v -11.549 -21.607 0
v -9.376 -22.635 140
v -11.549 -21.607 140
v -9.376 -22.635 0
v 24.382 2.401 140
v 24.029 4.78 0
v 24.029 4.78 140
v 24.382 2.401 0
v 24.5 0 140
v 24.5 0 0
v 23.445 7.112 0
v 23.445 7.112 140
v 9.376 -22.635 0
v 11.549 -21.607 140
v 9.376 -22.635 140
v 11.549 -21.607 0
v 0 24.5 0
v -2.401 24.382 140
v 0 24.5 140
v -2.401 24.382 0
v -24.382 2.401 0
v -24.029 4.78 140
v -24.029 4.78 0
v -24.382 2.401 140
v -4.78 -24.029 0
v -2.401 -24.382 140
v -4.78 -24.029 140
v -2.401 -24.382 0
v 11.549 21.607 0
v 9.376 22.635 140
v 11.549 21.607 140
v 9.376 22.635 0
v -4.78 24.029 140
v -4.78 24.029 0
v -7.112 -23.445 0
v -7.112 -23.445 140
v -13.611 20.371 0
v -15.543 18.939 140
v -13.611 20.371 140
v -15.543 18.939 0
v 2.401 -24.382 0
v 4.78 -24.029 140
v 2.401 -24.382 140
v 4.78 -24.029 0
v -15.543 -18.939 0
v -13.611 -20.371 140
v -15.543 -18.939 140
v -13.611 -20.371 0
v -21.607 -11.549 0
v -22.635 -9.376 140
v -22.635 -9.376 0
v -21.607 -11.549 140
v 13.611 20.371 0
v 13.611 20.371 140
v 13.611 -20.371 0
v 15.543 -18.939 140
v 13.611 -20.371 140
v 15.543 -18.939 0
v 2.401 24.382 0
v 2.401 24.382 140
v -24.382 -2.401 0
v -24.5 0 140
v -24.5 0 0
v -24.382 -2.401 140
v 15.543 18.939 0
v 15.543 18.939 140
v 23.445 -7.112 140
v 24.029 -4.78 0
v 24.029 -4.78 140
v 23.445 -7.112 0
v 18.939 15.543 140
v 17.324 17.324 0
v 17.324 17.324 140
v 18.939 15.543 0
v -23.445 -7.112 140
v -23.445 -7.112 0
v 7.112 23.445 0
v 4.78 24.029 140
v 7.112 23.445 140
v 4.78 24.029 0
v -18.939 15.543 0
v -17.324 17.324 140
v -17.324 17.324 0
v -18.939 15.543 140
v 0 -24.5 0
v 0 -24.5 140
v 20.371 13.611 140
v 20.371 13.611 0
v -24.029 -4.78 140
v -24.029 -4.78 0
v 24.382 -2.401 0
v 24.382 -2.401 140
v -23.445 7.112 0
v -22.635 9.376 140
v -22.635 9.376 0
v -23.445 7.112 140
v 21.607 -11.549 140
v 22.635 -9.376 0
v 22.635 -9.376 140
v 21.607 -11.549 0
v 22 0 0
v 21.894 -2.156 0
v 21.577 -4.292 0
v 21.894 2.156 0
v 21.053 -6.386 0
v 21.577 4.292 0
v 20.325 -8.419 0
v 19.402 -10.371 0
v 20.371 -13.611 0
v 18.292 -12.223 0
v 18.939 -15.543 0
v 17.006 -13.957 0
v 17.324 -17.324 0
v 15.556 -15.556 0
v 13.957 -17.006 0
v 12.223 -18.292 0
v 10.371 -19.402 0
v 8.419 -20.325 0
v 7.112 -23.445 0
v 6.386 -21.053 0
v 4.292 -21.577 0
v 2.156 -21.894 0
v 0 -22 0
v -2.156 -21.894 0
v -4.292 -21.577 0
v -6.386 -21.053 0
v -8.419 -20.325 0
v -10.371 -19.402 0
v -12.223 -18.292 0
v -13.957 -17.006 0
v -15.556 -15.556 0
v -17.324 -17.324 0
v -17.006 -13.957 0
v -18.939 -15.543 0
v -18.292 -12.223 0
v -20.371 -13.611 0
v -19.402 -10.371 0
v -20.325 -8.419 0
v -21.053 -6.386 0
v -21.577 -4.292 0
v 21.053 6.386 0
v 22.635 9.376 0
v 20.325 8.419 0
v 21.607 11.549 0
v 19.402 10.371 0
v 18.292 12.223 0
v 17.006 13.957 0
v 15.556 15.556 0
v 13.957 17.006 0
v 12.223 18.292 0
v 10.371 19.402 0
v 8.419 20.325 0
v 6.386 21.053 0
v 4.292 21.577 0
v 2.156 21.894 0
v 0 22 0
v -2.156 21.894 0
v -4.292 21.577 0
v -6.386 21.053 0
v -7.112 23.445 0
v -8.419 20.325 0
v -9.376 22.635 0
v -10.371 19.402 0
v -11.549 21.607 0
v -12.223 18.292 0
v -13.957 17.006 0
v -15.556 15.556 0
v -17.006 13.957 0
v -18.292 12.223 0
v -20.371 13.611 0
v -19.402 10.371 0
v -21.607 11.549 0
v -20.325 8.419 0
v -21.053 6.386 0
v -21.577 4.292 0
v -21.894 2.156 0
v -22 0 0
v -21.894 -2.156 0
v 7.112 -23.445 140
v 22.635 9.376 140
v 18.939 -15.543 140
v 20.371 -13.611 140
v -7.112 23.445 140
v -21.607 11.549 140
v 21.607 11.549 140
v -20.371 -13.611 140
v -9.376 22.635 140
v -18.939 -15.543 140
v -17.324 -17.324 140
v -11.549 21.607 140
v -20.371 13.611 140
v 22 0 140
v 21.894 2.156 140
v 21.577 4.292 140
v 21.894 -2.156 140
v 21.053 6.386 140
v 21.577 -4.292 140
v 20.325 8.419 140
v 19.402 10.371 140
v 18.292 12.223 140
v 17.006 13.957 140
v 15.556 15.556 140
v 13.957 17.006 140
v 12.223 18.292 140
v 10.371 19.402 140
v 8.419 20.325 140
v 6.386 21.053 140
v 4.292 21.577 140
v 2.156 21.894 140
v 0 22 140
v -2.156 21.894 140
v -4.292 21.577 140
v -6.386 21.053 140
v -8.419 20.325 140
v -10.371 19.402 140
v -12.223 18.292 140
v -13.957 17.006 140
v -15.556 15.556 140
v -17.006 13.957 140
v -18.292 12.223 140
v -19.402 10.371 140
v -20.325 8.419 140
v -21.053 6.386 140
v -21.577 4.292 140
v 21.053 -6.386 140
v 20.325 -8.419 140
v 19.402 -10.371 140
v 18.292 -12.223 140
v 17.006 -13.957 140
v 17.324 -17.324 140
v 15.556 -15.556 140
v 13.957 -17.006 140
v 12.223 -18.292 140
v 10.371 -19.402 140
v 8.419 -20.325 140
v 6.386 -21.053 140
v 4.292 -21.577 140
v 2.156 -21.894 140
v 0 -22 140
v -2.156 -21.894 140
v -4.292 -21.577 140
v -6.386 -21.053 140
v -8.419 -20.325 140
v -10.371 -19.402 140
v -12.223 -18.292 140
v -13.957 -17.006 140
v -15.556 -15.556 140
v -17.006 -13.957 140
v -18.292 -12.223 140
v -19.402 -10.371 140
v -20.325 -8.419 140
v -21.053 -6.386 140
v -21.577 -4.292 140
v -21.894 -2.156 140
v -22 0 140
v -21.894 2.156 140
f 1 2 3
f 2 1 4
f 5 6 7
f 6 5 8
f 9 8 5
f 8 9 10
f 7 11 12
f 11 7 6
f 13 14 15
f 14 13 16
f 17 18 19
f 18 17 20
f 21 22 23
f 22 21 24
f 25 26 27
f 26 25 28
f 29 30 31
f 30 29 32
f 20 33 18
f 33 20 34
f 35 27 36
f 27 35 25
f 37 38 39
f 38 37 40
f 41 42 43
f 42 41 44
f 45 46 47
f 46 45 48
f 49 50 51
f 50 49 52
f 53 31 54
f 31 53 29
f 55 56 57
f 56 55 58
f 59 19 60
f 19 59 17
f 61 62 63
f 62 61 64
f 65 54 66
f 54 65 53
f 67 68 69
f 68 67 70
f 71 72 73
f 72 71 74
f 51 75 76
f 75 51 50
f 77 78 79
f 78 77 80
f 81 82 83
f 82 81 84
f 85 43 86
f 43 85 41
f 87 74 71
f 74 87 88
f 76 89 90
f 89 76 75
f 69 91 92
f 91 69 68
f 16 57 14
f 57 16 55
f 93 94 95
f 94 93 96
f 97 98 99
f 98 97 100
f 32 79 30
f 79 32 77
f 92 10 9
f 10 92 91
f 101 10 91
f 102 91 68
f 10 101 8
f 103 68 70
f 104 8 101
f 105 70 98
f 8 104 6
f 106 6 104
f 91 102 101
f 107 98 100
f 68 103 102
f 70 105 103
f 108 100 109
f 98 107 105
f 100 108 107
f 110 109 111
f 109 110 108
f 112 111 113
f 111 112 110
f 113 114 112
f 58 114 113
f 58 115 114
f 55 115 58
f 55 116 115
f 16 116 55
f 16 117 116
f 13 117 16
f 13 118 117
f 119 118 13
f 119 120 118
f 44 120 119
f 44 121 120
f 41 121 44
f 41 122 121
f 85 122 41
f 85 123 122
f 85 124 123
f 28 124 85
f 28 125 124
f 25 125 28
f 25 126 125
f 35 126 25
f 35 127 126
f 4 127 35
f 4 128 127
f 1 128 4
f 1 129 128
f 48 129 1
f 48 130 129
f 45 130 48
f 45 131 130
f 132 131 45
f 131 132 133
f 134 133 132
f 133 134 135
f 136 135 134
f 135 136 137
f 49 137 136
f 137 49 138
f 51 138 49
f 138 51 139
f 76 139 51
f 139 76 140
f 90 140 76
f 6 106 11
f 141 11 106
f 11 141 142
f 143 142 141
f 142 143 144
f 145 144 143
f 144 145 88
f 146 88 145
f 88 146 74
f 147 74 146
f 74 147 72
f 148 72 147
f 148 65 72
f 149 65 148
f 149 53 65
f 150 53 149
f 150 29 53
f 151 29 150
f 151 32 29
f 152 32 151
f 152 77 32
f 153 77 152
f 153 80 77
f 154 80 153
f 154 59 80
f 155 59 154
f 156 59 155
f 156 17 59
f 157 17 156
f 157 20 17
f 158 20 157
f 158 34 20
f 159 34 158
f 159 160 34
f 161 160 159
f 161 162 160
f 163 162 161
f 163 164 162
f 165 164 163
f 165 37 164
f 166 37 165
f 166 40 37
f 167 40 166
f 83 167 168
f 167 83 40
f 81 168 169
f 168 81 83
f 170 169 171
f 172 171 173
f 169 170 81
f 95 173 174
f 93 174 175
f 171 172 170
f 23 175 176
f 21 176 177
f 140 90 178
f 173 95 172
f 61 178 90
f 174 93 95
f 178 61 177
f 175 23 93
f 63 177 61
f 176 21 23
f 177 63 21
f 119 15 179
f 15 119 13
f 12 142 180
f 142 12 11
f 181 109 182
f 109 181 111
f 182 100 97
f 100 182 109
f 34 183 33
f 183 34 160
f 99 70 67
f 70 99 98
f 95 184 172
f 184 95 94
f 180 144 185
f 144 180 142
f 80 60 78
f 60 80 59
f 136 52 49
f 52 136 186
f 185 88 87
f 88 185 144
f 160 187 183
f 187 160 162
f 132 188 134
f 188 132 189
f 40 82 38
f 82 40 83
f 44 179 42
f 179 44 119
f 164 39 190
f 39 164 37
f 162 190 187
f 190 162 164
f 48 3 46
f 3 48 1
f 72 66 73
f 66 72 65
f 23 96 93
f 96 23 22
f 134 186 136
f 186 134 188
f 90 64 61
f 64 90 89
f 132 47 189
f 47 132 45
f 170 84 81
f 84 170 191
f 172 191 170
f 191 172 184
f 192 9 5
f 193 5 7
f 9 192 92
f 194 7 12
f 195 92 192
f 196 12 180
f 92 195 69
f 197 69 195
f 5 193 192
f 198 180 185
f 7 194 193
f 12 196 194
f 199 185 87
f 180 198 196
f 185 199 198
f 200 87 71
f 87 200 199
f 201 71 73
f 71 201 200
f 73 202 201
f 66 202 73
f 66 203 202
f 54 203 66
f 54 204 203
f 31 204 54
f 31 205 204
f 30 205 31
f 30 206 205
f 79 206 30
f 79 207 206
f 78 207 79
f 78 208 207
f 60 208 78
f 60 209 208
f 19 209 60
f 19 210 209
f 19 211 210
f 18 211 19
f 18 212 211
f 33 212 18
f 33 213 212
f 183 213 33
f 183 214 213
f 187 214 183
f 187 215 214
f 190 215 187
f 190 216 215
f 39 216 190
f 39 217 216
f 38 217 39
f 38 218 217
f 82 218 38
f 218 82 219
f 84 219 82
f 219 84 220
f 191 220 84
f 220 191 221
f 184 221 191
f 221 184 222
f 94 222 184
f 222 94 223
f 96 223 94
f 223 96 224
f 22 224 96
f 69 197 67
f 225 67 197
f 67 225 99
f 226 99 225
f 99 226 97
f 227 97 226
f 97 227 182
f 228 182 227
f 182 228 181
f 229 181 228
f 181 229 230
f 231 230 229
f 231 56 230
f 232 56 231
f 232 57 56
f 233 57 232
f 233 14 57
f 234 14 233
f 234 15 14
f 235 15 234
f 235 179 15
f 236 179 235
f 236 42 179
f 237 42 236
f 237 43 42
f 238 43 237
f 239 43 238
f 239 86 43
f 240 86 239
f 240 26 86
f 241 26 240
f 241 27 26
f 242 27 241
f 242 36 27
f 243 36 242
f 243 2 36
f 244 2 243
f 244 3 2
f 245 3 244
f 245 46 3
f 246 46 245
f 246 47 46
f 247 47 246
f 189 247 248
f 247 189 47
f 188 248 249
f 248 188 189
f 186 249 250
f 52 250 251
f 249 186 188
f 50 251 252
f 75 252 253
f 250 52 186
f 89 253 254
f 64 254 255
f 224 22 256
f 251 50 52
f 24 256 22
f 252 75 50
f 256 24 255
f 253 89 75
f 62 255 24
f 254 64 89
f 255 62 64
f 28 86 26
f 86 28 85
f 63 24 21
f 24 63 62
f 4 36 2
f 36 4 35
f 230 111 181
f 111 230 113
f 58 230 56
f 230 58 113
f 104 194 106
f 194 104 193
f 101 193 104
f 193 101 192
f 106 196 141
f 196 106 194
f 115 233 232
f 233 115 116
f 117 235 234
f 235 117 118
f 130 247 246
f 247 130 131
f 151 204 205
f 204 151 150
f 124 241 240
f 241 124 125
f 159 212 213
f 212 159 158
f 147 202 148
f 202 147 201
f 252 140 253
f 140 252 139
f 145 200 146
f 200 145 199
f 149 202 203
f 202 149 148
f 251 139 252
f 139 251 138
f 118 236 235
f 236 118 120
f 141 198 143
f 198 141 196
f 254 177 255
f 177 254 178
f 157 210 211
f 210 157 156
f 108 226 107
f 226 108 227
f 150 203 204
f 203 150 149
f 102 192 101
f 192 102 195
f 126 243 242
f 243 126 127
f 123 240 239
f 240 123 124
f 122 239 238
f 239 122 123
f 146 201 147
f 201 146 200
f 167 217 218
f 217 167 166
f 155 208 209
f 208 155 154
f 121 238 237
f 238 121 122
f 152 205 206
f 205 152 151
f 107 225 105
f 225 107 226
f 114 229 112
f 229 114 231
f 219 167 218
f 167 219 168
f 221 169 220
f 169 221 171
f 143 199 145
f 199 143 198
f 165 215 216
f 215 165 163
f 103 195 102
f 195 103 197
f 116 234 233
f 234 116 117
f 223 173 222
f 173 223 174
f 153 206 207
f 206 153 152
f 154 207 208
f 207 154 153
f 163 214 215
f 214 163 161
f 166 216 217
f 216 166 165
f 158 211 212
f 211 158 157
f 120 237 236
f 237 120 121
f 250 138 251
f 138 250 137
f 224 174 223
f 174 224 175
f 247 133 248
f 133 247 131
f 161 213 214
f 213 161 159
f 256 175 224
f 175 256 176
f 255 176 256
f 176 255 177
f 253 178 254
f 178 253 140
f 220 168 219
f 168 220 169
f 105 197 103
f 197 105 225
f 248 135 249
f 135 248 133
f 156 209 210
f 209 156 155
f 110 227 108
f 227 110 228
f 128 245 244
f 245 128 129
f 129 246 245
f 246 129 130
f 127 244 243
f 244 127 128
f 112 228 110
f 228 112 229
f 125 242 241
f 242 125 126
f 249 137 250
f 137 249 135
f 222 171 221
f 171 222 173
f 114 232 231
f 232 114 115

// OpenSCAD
// file: ../../config.scad
// Ebike Configuration
// All dimensions in mm

// =============================================================================
// RIDER PARAMETERS
// =============================================================================
rider_height = 173;
rider_weight = 55;

// =============================================================================
// FRAME GEOMETRY
// =============================================================================
frame_size = 520;                    // Seat tube center-to-top
top_tube_effective = 545;
head_tube_length = 140;
head_tube_angle = 70;
seat_tube_angle = 72;
chainstay_length = 460;
bb_drop = 65;
wheelbase = 1080;
standover_height = 450;              // Step-through
stack = 620;
reach = 370;

// =============================================================================
// TUBE DIAMETERS
// =============================================================================
head_tube_id = 44;                   // 1-1/8" straight steerer
head_tube_od = 49;
seat_tube_id = 27.2;                 // Standard seatpost
down_tube_od = 44;
top_tube_od = 32;
seat_stay_od = 16;
chainstay_od = 22;

// =============================================================================
// MOTOR CONFIGURATION
// =============================================================================
motor_type = "mid-drive";
bb_shell_width = 68;                 // BSA standard
bb_clearance_width = 120;

// =============================================================================
// DROPOUT PARAMETERS
// =============================================================================
dropout_material = "6061-T6";
dropout_thickness = 10;
dropout_width = 45;
dropout_height = 80;
dropout_axle_spacing = 142;          // Boost thru-axle
dropout_axle_diameter = 12;

// =============================================================================
// BOTTOM BRACKET SHELL
// =============================================================================
bb_shell_od = 42;
bb_shell_id = 34.8;                  // BSA threaded
bb_thread_tpi = 24;                  // BSA 1.37" x 24 TPI

// =============================================================================
// HEAD TUBE
// =============================================================================
// Uses head_tube_length, head_tube_id, head_tube_od from above

// =============================================================================
// SEAT COLLAR
// =============================================================================
seat_collar_id = 31.8;               // For 27.2mm post with shim
seat_collar_od = 38;
seat_collar_height = 25;

// =============================================================================
// MOTOR MOUNT
// =============================================================================
motor_mount_thickness = 8;
motor_mount_width = 120;
motor_mount_height = 100;

// =============================================================================
// BATTERY MOUNT
// =============================================================================
battery_mount_thickness = 6;
battery_mount_width = 60;
battery_mount_height = 40;
battery_mount_quantity = 4;

// =============================================================================
// BRAKE MOUNT (Post Mount)
// =============================================================================
brake_mount_thickness = 10;
brake_mount_width = 80;
brake_mount_height = 50;
brake_post_bolt_spacing = 74;        // Post mount standard
brake_rotor_size_front = 180;
brake_rotor_size_rear = 160;

// =============================================================================
// CABLE GUIDES
// =============================================================================
cable_guide_length = 25;
cable_guide_width = 15;
cable_guide_height = 8;
cable_guide_quantity = 6;

// =============================================================================
// HEADSET CUPS
// =============================================================================
headset_cup_od = 44;
headset_bearing_seat = 30;

// =============================================================================
// RACK/FENDER MOUNTS
// =============================================================================
rack_mount_length = 30;
rack_mount_width = 20;
rack_mount_height = 10;
rack_mount_thread = 5;               // M5
rack_mount_quantity = 4;

// =============================================================================
// GUSSET PLATES
// =============================================================================
gusset_thickness = 6;
gusset_width = 80;
gusset_height = 60;
gusset_quantity = 2;

// =============================================================================
// COMPOSITE FRAME TUBES (FibreSeeker 3)
// =============================================================================
// Wall thickness for carbon fiber reinforced tubes
tube_wall_thickness = 3;

// Down tube (curved for step-through)
down_tube_length = 650;              // Along curve
down_tube_curve_radius = 800;        // Radius of curve

// Seat tube
seat_tube_length = 520;              // frame_size
seat_tube_od = 34;                   // Outer diameter

// Chainstays
chainstay_wall = 2.5;

// Seat stays
seat_stay_length = 480;
seat_stay_wall = 2;

// =============================================================================
// TUBE SECTIONING (for build volume constraints)
// =============================================================================
// Joint design: internal aluminum sleeve with M6 through-bolts
joint_overlap = 30;                  // Overlap length per joint
joint_bolt_diameter = 6;             // M6 bolts
joint_bolt_count = 2;                // Bolts per joint

// Section counts
down_tube_sections = 3;
seat_tube_sections = 2;
chainstay_sections = 2;
seat_stay_sections = 2;

// Sleeve parameters (CNC milled aluminum)
sleeve_wall_thickness = 2;
sleeve_length = 60;                  // Total sleeve length (2x overlap)

// =============================================================================
// MANUFACTURING TOLERANCES
// =============================================================================
tolerance_press_fit = 0.05;
tolerance_general = 0.1;

// =============================================================================
// COMMON CONSTANTS
// =============================================================================
$fn = 64;                            // Circle resolution
epsilon = 0.01;                      // For boolean operations
// main file
// Head Tube
// CNC milled component for NestWorks C500

include <../../config.scad>

module head_tube() {
    difference() {
        // Outer cylinder
        cylinder(h = head_tube_length, d = head_tube_od);

        // Inner bore (for headset)
        translate([0, 0, -epsilon])
            cylinder(h = head_tube_length + 2*epsilon, d = head_tube_id);
    }
}

// Render for preview
head_tube();
